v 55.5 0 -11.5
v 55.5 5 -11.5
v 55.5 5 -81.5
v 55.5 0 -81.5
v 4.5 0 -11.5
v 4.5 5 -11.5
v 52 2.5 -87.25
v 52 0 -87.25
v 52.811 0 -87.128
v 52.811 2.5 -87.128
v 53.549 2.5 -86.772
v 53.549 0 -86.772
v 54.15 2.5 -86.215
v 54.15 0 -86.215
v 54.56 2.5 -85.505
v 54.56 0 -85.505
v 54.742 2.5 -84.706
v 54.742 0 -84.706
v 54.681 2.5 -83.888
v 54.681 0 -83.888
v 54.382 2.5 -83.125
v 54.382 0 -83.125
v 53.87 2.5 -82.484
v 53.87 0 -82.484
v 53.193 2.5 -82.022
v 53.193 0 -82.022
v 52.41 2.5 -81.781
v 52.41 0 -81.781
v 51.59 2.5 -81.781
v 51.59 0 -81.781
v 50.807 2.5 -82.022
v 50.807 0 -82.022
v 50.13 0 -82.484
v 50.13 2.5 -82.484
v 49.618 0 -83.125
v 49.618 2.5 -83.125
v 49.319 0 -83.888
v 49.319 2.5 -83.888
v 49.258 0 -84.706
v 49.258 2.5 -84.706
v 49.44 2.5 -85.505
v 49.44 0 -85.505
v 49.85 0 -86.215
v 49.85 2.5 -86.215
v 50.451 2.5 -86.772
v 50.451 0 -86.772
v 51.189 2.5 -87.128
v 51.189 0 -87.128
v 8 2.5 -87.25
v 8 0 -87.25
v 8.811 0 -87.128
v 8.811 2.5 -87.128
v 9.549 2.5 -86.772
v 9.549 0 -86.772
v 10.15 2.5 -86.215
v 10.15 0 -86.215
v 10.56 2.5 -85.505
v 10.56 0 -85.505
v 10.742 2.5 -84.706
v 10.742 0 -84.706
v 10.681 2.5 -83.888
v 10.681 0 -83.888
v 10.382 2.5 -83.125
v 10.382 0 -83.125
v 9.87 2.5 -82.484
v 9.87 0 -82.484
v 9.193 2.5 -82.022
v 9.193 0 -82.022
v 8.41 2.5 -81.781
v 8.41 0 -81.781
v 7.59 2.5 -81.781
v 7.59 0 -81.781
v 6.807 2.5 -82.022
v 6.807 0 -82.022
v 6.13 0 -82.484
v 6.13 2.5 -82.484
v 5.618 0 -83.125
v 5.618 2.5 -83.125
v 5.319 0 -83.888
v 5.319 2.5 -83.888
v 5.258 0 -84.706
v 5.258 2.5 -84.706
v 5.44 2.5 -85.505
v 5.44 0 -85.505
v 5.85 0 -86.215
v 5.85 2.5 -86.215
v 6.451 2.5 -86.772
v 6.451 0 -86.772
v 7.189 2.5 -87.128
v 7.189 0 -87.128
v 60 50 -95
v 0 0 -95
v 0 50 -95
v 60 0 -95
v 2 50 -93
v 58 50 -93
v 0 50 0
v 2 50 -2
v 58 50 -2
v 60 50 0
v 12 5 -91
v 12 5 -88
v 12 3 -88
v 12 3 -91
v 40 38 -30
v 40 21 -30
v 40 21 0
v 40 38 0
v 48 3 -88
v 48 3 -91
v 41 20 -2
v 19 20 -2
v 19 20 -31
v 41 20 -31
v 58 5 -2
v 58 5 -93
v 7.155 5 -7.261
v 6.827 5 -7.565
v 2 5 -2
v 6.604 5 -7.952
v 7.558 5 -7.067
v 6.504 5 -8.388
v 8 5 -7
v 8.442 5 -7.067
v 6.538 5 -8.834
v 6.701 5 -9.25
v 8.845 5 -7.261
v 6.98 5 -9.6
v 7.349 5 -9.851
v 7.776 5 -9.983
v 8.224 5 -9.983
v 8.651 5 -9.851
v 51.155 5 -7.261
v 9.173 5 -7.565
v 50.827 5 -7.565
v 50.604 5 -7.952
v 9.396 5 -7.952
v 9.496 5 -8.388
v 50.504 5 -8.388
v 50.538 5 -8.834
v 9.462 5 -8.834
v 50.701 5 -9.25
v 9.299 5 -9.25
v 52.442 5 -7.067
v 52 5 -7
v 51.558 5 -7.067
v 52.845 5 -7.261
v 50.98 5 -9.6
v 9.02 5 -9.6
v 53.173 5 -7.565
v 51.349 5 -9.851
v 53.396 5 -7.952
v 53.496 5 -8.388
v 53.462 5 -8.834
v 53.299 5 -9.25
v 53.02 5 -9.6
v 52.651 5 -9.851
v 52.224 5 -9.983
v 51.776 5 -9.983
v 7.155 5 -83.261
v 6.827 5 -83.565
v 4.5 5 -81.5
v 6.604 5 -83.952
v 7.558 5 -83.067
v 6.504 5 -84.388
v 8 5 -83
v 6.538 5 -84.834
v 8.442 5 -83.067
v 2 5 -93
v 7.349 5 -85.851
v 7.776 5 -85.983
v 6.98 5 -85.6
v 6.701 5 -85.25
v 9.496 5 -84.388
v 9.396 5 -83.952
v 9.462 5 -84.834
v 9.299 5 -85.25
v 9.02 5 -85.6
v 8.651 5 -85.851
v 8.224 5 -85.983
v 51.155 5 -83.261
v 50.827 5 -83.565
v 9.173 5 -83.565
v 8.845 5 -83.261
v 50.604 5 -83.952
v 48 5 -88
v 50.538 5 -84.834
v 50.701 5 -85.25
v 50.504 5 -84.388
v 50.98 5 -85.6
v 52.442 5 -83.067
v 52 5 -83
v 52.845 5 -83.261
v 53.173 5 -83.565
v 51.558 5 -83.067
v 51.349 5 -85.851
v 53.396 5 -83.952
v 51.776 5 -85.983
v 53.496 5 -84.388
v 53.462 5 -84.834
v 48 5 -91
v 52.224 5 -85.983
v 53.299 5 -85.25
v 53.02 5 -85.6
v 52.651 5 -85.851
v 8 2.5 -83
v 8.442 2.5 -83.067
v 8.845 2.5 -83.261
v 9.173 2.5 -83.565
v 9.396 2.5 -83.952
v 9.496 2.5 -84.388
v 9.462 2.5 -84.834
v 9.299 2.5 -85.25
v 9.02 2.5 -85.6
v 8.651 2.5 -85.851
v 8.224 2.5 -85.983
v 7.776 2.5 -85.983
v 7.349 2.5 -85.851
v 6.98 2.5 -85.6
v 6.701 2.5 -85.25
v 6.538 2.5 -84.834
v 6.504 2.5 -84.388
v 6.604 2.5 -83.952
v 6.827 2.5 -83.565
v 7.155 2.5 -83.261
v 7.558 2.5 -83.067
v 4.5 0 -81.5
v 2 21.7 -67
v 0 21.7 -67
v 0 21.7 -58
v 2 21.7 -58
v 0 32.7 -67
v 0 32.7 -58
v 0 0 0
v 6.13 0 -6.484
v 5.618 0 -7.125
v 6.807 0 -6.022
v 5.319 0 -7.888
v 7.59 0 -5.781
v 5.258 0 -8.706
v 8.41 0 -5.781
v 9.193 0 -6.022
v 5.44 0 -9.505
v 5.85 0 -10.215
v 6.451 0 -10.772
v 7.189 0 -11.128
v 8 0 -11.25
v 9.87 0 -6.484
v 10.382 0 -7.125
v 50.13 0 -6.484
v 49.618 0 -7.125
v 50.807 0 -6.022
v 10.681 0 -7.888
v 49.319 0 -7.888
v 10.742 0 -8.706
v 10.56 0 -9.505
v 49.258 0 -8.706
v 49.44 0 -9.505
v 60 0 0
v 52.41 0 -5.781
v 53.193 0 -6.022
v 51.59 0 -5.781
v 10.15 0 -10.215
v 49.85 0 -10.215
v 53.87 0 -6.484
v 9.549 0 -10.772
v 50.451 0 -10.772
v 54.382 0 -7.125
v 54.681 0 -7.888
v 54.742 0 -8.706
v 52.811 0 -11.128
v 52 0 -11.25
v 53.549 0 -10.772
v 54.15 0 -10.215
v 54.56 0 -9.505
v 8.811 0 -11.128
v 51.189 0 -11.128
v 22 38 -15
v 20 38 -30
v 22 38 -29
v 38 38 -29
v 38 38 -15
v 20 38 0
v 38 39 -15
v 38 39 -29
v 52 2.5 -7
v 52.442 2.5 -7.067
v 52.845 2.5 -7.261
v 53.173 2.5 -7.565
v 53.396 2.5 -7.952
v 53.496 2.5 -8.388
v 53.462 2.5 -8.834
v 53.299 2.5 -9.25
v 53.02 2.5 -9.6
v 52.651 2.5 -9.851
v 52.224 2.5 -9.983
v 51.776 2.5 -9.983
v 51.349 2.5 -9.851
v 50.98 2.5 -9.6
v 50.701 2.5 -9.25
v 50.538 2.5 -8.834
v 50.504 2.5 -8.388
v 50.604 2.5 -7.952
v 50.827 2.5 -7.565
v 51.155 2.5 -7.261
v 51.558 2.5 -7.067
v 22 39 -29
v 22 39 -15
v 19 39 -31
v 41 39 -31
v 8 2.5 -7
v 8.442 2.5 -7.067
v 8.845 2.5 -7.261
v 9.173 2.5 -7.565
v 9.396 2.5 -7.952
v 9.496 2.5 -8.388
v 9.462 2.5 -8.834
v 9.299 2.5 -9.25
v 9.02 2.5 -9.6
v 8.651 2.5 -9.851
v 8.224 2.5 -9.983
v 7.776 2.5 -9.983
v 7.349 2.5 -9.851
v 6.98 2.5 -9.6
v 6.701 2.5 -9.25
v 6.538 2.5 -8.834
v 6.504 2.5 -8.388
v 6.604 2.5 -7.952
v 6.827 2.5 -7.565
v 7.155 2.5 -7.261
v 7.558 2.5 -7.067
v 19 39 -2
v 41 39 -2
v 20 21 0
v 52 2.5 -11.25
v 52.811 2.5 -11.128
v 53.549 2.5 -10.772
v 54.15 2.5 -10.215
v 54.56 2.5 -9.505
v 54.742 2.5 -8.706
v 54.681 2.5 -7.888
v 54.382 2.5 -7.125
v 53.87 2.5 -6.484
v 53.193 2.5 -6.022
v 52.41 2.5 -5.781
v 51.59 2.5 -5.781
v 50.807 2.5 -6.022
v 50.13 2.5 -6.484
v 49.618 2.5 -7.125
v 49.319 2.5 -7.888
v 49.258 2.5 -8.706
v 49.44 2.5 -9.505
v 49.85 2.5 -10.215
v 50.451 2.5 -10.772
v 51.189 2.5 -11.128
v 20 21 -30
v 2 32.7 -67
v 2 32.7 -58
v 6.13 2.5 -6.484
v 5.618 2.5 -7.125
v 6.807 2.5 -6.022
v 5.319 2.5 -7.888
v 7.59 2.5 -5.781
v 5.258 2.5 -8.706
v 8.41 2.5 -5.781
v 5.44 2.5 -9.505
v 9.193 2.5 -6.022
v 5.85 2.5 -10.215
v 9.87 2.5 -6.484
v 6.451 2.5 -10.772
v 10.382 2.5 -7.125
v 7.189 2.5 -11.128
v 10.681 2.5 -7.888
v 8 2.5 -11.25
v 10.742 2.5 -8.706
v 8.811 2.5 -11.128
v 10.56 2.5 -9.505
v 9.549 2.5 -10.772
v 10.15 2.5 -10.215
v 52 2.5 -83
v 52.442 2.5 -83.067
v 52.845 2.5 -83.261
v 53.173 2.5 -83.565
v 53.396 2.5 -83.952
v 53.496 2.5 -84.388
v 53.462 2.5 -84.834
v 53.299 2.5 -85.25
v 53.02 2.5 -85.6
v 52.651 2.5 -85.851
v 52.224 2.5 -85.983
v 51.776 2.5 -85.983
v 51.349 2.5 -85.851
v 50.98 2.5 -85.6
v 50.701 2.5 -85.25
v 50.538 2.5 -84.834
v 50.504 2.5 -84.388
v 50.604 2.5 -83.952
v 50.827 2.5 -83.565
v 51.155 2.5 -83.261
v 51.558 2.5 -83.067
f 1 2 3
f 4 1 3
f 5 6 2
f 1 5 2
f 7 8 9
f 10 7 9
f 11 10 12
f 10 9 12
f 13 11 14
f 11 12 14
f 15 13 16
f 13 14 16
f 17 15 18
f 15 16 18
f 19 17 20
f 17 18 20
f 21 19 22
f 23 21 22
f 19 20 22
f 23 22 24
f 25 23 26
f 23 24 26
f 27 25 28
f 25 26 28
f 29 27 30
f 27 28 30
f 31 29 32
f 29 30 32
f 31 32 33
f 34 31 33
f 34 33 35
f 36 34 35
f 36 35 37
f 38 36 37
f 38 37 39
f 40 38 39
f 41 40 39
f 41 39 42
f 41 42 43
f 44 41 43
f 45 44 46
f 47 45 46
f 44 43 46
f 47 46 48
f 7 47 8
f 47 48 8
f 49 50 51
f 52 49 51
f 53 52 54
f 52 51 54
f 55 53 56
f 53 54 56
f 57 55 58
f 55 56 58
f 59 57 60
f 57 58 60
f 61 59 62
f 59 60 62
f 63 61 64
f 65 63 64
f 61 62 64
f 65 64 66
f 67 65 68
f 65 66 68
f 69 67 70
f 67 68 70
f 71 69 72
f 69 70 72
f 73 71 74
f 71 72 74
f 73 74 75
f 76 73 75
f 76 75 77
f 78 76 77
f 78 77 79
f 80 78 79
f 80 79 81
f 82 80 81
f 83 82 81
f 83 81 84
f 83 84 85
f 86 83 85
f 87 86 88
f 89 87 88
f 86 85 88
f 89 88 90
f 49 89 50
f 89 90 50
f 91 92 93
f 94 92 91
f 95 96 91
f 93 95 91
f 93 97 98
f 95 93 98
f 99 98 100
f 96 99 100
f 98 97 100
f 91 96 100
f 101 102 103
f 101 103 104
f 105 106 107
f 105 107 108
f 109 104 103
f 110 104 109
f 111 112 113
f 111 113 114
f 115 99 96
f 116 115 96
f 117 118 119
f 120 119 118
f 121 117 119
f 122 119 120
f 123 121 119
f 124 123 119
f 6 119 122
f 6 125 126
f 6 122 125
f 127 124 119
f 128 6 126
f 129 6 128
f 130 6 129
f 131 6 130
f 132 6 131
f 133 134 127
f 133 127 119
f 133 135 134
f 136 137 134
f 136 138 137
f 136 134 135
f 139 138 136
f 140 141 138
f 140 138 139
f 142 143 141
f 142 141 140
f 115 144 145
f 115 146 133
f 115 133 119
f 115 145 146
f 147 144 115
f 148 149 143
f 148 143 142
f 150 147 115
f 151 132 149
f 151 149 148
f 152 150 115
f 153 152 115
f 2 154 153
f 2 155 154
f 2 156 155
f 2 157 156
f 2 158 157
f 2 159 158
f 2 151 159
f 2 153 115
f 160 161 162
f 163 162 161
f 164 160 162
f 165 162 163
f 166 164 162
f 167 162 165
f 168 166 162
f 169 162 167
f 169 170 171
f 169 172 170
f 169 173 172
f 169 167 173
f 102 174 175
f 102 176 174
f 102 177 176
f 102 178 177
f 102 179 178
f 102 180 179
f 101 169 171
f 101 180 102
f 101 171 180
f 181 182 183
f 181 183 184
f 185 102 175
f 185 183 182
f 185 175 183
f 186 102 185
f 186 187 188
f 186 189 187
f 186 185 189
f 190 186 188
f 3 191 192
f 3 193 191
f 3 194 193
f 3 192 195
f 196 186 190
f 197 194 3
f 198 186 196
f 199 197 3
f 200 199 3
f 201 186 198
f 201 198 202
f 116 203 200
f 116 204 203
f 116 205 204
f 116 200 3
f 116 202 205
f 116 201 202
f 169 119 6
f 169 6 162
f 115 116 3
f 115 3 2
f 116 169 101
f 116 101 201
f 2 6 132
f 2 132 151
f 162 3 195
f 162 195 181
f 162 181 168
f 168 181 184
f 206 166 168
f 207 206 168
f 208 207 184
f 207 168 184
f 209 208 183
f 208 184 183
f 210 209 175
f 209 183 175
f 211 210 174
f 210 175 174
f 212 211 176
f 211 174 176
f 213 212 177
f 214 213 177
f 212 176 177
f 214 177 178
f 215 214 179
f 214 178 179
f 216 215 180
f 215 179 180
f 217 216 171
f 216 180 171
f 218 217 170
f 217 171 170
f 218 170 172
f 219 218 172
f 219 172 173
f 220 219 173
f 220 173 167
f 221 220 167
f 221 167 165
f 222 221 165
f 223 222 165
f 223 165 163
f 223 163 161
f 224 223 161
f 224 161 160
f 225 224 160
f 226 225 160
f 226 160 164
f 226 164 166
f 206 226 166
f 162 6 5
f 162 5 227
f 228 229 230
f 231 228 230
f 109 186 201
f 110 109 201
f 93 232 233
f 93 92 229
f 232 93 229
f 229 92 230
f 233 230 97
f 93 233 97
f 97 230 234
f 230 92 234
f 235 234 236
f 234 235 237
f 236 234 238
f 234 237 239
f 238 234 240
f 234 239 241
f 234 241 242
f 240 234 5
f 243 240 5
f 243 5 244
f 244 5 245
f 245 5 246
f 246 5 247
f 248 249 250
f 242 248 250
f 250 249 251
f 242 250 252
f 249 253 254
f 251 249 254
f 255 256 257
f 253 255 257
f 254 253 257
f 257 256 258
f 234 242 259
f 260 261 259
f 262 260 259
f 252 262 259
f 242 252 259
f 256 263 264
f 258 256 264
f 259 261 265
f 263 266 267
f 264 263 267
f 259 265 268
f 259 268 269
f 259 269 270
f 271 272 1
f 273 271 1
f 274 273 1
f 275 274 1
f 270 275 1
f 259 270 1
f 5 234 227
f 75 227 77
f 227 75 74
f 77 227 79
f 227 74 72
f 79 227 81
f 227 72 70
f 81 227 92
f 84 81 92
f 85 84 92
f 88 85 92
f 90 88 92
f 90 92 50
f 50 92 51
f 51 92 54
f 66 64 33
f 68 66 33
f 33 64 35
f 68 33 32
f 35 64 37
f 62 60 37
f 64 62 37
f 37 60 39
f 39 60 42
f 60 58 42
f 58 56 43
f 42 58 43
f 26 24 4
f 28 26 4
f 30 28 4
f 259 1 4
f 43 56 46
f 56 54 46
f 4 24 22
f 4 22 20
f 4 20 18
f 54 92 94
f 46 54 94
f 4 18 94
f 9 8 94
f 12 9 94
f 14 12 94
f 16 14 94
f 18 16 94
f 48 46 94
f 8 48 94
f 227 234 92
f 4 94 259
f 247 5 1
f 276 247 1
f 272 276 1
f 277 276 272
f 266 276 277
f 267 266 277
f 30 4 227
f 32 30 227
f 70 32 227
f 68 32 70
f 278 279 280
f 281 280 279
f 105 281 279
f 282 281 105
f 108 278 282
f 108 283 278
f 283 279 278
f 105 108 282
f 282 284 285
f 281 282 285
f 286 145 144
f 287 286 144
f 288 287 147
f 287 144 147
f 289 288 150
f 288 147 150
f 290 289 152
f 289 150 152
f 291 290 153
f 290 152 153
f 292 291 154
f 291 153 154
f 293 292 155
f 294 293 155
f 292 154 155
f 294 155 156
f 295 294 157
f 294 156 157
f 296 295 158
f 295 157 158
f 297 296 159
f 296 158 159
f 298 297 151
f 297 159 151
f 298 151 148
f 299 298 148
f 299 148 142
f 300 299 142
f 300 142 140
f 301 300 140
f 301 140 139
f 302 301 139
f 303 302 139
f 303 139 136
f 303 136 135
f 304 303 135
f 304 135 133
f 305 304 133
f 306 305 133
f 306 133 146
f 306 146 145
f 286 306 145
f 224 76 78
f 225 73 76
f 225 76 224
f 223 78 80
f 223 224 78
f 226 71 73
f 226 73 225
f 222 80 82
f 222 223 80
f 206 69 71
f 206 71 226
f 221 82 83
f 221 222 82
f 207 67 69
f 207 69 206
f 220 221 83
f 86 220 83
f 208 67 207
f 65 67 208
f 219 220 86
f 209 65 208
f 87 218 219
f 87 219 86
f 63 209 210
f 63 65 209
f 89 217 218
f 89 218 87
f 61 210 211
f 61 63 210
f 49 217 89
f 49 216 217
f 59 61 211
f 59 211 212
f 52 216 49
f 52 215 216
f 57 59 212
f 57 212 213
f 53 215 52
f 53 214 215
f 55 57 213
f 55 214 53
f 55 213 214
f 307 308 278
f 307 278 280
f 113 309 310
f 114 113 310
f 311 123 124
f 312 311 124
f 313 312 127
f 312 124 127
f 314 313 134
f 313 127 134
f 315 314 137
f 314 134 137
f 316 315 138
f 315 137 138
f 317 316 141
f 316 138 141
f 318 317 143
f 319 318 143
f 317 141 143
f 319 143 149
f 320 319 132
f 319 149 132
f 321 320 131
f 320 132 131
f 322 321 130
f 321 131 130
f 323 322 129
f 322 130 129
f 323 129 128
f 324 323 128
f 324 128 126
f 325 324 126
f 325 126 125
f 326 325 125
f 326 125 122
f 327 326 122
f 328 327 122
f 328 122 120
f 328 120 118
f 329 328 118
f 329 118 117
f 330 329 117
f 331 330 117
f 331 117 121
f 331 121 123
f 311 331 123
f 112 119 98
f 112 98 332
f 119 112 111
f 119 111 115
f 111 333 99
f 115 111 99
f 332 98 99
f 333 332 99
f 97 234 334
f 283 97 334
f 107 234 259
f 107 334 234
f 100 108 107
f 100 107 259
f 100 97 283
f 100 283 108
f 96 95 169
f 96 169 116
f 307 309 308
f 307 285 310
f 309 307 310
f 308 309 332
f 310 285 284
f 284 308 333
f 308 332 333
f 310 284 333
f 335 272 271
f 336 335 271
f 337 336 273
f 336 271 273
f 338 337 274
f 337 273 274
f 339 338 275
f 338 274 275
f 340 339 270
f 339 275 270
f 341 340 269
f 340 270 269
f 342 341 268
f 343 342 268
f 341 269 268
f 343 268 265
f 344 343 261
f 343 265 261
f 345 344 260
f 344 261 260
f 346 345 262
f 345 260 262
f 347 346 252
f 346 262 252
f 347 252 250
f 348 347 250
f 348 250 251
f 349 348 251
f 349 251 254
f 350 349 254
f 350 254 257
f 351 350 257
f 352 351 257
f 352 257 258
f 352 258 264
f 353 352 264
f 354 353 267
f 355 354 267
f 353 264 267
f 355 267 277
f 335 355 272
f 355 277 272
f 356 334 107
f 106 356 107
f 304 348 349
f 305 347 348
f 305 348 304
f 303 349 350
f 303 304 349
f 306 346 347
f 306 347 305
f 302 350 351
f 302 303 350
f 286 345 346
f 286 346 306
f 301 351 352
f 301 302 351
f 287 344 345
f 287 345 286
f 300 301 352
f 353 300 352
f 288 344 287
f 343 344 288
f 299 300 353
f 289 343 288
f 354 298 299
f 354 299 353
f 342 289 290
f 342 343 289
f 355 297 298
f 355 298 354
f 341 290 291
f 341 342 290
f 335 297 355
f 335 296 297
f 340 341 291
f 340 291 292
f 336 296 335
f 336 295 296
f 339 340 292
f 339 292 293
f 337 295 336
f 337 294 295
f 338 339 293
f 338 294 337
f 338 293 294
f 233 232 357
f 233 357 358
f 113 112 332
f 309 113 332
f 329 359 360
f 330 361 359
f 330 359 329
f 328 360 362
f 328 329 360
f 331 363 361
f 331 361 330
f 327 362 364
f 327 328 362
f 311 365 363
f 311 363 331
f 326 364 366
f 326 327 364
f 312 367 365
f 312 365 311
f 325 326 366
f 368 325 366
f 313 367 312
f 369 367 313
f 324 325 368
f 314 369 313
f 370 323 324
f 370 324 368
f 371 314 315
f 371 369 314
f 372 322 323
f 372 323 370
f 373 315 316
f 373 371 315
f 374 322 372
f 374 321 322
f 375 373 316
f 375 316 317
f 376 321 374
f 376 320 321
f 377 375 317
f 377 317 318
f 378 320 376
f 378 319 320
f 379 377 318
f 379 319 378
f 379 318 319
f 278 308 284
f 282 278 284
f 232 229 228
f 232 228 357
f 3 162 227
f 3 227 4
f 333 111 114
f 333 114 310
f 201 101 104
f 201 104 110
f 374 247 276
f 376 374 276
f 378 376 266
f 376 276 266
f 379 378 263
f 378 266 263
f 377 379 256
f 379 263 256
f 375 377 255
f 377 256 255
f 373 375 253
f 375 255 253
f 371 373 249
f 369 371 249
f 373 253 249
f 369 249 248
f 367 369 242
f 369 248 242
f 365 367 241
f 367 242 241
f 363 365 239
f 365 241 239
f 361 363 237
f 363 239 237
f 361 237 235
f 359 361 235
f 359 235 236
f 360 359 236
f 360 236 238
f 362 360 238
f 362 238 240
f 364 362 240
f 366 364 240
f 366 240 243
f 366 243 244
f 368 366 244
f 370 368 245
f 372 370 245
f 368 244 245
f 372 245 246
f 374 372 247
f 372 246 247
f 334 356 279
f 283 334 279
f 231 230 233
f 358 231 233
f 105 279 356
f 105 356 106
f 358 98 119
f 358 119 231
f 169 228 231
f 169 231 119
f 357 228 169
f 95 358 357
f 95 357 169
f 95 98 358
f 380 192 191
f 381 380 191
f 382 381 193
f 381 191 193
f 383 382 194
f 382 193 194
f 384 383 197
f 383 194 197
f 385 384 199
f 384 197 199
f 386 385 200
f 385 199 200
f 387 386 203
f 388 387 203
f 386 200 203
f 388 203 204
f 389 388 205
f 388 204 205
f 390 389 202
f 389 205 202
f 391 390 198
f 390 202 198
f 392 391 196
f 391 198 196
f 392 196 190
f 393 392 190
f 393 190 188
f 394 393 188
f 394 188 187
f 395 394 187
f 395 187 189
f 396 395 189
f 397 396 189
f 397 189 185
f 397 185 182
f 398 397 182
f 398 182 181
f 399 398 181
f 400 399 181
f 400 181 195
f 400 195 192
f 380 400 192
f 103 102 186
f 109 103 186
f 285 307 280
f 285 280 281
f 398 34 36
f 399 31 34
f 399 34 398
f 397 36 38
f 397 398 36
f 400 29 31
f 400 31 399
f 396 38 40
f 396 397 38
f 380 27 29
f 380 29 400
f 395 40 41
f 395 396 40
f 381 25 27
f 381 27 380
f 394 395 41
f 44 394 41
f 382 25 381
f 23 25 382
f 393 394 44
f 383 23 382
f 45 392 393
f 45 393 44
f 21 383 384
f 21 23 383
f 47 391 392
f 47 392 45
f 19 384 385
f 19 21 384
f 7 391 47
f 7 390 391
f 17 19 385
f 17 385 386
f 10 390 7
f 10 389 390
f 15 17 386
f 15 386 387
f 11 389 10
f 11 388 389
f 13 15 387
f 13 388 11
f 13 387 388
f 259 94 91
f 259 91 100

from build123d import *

# Parameters (mm, degrees)
SKETCH_2_W          = 60
SKETCH_2_H          = 95
EXTRUDE_1_DEPTH     = 45
SKETCH_3_W          = 56
SKETCH_3_H          = 91
CUT_EXTRUDE_1_DEPTH = 40
SKETCH_5_W          = 51
SKETCH_5_H          = 70
CUT_EXTRUDE_2_DEPTH = 5
SKETCH_6_R          = 1.5
CUT_EXTRUDE_3_DEPTH = 5
SKETCH_8_R          = 2.75
CUT_EXTRUDE_4_DEPTH = 2.5
SKETCH_10_W         = 36
SKETCH_10_H         = 3
CUT_EXTRUDE_5_DEPTH = 2
SKETCH_11_W         = 60
SKETCH_11_H         = 95
EXTRUDE_2_DEPTH     = 5
SKETCH_12_W         = 56
SKETCH_12_H         = 91
CUT_EXTRUDE_6_DEPTH = 5
SKETCH_13_W         = 9
SKETCH_13_H         = 11
CUT_EXTRUDE_7_DEPTH = 5
SKETCH_14_W         = 22
SKETCH_14_H         = 19
EXTRUDE_3_DEPTH     = 31
SKETCH_15_W         = 20
SKETCH_15_H         = 17
CUT_EXTRUDE_8_DEPTH = 30
SKETCH_16_W         = 16
SKETCH_16_H         = 14
CUT_EXTRUDE_9_DEPTH = 2


with BuildPart() as part:
    # 草圖2 → 填料-伸長1 (new body)
    with BuildSketch(Plane(origin=(0, 0, 0), x_dir=(1, 0, 0), z_dir=(0, 1, 0))):
        with Locations((30, 47.5)):
            Rectangle(SKETCH_2_W, SKETCH_2_H)
    extrude(amount=EXTRUDE_1_DEPTH)

    # 草圖3 → 除料-伸長1 (cut)
    with BuildSketch(Plane(origin=(0, 45, 0), x_dir=(1, 0, 0), z_dir=(0, 1, 0))):
        with Locations((30, 47.5)):
            Rectangle(SKETCH_3_W, SKETCH_3_H)
    extrude(amount=-CUT_EXTRUDE_1_DEPTH, mode=Mode.SUBTRACT)

    # 草圖5 → 除料-伸長2 (cut)
    with BuildSketch(Plane(origin=(0, 5, 0), x_dir=(1, 0, 0), z_dir=(0, 1, 0))):
        with Locations((30, 46.5)):
            Rectangle(SKETCH_5_W, SKETCH_5_H)
    extrude(amount=-CUT_EXTRUDE_2_DEPTH, mode=Mode.SUBTRACT)

    # 草圖6 → 除料-伸長3 (cut)
    with BuildSketch(Plane(origin=(0, 5, 0), x_dir=(1, 0, 0), z_dir=(0, 1, 0))):
        with Locations(Location((8, 8.5, 0), (0, 0, 270))):  # turned: the seam where the file's is
            Circle(SKETCH_6_R)
        with Locations(Location((52, 8.5, 0), (0, 0, 270))):  # turned: the seam where the file's is
            Circle(SKETCH_6_R)
        with Locations(Location((8, 84.5, 0), (0, 0, 270))):  # turned: the seam where the file's is
            Circle(SKETCH_6_R)
        with Locations(Location((52, 84.5, 0), (0, 0, 270))):  # turned: the seam where the file's is
            Circle(SKETCH_6_R)
    extrude(amount=-CUT_EXTRUDE_3_DEPTH, mode=Mode.SUBTRACT)

    # 草圖8 → 除料-伸長4 (cut)
    with BuildSketch(Plane(origin=(0, 0, 0), x_dir=(-1, 0, 0), z_dir=(0, -1, 0))):
        with Locations(Location((-8, 84.5, 0), (0, 0, 90))):  # turned: the seam where the file's is
            Circle(SKETCH_8_R)
        with Locations(Location((-8, 8.5, 0), (0, 0, 90))):  # turned: the seam where the file's is
            Circle(SKETCH_8_R)
        with Locations(Location((-52, 8.5, 0), (0, 0, 90))):  # turned: the seam where the file's is
            Circle(SKETCH_8_R)
        with Locations(Location((-52, 84.5, 0), (0, 0, 90))):  # turned: the seam where the file's is
            Circle(SKETCH_8_R)
    extrude(amount=-CUT_EXTRUDE_4_DEPTH, mode=Mode.SUBTRACT)

    # 草圖10 → 除料-伸長5 (cut)
    with BuildSketch(Plane(origin=(0, 5, 0), x_dir=(1, 0, 0), z_dir=(0, 1, 0))):
        with Locations((30, 89.5)):
            Rectangle(SKETCH_10_W, SKETCH_10_H)
    extrude(amount=-CUT_EXTRUDE_5_DEPTH, mode=Mode.SUBTRACT)

    # 草圖11 → 填料-伸長2 (add)
    with BuildSketch(Plane.XZ.offset(-45)):
        with Locations((30, -47.5)):
            Rectangle(SKETCH_11_W, SKETCH_11_H)
    extrude(amount=-EXTRUDE_2_DEPTH)

    # 草圖12 → 除料-伸長6 (cut)
    with BuildSketch(Plane(origin=(0, 50, 0), x_dir=(1, 0, 0), z_dir=(0, 1, 0))):
        with Locations((30, 47.5)):
            Rectangle(SKETCH_12_W, SKETCH_12_H)
    extrude(amount=-CUT_EXTRUDE_6_DEPTH, mode=Mode.SUBTRACT)

    # 草圖13 → 除料-伸長7 (cut)
    with BuildSketch(Plane.ZY):
        with Locations((-62.5, 27.2)):
            Rectangle(SKETCH_13_W, SKETCH_13_H)
    extrude(amount=-CUT_EXTRUDE_7_DEPTH, mode=Mode.SUBTRACT)

    # 草圖14 → 填料-伸長3 (add)
    with BuildSketch(Plane.XY):
        with Locations((30, 29.5)):
            Rectangle(SKETCH_14_W, SKETCH_14_H)
    extrude(amount=-EXTRUDE_3_DEPTH)

    # 草圖15 → 除料-伸長8 (cut)
    with BuildSketch(Plane.XY):
        with Locations((30, 29.5)):
            Rectangle(SKETCH_15_W, SKETCH_15_H)
    extrude(amount=-CUT_EXTRUDE_8_DEPTH, mode=Mode.SUBTRACT)

    # 草圖16 → 除料-伸長9 (cut)
    with BuildSketch(Plane(origin=(0, 39, 0), x_dir=(1, 0, 0), z_dir=(0, 1, 0))):
        with Locations((30, 22)):
            Rectangle(SKETCH_16_W, SKETCH_16_H)
    extrude(amount=-CUT_EXTRUDE_9_DEPTH, mode=Mode.SUBTRACT)


solid = part.part
